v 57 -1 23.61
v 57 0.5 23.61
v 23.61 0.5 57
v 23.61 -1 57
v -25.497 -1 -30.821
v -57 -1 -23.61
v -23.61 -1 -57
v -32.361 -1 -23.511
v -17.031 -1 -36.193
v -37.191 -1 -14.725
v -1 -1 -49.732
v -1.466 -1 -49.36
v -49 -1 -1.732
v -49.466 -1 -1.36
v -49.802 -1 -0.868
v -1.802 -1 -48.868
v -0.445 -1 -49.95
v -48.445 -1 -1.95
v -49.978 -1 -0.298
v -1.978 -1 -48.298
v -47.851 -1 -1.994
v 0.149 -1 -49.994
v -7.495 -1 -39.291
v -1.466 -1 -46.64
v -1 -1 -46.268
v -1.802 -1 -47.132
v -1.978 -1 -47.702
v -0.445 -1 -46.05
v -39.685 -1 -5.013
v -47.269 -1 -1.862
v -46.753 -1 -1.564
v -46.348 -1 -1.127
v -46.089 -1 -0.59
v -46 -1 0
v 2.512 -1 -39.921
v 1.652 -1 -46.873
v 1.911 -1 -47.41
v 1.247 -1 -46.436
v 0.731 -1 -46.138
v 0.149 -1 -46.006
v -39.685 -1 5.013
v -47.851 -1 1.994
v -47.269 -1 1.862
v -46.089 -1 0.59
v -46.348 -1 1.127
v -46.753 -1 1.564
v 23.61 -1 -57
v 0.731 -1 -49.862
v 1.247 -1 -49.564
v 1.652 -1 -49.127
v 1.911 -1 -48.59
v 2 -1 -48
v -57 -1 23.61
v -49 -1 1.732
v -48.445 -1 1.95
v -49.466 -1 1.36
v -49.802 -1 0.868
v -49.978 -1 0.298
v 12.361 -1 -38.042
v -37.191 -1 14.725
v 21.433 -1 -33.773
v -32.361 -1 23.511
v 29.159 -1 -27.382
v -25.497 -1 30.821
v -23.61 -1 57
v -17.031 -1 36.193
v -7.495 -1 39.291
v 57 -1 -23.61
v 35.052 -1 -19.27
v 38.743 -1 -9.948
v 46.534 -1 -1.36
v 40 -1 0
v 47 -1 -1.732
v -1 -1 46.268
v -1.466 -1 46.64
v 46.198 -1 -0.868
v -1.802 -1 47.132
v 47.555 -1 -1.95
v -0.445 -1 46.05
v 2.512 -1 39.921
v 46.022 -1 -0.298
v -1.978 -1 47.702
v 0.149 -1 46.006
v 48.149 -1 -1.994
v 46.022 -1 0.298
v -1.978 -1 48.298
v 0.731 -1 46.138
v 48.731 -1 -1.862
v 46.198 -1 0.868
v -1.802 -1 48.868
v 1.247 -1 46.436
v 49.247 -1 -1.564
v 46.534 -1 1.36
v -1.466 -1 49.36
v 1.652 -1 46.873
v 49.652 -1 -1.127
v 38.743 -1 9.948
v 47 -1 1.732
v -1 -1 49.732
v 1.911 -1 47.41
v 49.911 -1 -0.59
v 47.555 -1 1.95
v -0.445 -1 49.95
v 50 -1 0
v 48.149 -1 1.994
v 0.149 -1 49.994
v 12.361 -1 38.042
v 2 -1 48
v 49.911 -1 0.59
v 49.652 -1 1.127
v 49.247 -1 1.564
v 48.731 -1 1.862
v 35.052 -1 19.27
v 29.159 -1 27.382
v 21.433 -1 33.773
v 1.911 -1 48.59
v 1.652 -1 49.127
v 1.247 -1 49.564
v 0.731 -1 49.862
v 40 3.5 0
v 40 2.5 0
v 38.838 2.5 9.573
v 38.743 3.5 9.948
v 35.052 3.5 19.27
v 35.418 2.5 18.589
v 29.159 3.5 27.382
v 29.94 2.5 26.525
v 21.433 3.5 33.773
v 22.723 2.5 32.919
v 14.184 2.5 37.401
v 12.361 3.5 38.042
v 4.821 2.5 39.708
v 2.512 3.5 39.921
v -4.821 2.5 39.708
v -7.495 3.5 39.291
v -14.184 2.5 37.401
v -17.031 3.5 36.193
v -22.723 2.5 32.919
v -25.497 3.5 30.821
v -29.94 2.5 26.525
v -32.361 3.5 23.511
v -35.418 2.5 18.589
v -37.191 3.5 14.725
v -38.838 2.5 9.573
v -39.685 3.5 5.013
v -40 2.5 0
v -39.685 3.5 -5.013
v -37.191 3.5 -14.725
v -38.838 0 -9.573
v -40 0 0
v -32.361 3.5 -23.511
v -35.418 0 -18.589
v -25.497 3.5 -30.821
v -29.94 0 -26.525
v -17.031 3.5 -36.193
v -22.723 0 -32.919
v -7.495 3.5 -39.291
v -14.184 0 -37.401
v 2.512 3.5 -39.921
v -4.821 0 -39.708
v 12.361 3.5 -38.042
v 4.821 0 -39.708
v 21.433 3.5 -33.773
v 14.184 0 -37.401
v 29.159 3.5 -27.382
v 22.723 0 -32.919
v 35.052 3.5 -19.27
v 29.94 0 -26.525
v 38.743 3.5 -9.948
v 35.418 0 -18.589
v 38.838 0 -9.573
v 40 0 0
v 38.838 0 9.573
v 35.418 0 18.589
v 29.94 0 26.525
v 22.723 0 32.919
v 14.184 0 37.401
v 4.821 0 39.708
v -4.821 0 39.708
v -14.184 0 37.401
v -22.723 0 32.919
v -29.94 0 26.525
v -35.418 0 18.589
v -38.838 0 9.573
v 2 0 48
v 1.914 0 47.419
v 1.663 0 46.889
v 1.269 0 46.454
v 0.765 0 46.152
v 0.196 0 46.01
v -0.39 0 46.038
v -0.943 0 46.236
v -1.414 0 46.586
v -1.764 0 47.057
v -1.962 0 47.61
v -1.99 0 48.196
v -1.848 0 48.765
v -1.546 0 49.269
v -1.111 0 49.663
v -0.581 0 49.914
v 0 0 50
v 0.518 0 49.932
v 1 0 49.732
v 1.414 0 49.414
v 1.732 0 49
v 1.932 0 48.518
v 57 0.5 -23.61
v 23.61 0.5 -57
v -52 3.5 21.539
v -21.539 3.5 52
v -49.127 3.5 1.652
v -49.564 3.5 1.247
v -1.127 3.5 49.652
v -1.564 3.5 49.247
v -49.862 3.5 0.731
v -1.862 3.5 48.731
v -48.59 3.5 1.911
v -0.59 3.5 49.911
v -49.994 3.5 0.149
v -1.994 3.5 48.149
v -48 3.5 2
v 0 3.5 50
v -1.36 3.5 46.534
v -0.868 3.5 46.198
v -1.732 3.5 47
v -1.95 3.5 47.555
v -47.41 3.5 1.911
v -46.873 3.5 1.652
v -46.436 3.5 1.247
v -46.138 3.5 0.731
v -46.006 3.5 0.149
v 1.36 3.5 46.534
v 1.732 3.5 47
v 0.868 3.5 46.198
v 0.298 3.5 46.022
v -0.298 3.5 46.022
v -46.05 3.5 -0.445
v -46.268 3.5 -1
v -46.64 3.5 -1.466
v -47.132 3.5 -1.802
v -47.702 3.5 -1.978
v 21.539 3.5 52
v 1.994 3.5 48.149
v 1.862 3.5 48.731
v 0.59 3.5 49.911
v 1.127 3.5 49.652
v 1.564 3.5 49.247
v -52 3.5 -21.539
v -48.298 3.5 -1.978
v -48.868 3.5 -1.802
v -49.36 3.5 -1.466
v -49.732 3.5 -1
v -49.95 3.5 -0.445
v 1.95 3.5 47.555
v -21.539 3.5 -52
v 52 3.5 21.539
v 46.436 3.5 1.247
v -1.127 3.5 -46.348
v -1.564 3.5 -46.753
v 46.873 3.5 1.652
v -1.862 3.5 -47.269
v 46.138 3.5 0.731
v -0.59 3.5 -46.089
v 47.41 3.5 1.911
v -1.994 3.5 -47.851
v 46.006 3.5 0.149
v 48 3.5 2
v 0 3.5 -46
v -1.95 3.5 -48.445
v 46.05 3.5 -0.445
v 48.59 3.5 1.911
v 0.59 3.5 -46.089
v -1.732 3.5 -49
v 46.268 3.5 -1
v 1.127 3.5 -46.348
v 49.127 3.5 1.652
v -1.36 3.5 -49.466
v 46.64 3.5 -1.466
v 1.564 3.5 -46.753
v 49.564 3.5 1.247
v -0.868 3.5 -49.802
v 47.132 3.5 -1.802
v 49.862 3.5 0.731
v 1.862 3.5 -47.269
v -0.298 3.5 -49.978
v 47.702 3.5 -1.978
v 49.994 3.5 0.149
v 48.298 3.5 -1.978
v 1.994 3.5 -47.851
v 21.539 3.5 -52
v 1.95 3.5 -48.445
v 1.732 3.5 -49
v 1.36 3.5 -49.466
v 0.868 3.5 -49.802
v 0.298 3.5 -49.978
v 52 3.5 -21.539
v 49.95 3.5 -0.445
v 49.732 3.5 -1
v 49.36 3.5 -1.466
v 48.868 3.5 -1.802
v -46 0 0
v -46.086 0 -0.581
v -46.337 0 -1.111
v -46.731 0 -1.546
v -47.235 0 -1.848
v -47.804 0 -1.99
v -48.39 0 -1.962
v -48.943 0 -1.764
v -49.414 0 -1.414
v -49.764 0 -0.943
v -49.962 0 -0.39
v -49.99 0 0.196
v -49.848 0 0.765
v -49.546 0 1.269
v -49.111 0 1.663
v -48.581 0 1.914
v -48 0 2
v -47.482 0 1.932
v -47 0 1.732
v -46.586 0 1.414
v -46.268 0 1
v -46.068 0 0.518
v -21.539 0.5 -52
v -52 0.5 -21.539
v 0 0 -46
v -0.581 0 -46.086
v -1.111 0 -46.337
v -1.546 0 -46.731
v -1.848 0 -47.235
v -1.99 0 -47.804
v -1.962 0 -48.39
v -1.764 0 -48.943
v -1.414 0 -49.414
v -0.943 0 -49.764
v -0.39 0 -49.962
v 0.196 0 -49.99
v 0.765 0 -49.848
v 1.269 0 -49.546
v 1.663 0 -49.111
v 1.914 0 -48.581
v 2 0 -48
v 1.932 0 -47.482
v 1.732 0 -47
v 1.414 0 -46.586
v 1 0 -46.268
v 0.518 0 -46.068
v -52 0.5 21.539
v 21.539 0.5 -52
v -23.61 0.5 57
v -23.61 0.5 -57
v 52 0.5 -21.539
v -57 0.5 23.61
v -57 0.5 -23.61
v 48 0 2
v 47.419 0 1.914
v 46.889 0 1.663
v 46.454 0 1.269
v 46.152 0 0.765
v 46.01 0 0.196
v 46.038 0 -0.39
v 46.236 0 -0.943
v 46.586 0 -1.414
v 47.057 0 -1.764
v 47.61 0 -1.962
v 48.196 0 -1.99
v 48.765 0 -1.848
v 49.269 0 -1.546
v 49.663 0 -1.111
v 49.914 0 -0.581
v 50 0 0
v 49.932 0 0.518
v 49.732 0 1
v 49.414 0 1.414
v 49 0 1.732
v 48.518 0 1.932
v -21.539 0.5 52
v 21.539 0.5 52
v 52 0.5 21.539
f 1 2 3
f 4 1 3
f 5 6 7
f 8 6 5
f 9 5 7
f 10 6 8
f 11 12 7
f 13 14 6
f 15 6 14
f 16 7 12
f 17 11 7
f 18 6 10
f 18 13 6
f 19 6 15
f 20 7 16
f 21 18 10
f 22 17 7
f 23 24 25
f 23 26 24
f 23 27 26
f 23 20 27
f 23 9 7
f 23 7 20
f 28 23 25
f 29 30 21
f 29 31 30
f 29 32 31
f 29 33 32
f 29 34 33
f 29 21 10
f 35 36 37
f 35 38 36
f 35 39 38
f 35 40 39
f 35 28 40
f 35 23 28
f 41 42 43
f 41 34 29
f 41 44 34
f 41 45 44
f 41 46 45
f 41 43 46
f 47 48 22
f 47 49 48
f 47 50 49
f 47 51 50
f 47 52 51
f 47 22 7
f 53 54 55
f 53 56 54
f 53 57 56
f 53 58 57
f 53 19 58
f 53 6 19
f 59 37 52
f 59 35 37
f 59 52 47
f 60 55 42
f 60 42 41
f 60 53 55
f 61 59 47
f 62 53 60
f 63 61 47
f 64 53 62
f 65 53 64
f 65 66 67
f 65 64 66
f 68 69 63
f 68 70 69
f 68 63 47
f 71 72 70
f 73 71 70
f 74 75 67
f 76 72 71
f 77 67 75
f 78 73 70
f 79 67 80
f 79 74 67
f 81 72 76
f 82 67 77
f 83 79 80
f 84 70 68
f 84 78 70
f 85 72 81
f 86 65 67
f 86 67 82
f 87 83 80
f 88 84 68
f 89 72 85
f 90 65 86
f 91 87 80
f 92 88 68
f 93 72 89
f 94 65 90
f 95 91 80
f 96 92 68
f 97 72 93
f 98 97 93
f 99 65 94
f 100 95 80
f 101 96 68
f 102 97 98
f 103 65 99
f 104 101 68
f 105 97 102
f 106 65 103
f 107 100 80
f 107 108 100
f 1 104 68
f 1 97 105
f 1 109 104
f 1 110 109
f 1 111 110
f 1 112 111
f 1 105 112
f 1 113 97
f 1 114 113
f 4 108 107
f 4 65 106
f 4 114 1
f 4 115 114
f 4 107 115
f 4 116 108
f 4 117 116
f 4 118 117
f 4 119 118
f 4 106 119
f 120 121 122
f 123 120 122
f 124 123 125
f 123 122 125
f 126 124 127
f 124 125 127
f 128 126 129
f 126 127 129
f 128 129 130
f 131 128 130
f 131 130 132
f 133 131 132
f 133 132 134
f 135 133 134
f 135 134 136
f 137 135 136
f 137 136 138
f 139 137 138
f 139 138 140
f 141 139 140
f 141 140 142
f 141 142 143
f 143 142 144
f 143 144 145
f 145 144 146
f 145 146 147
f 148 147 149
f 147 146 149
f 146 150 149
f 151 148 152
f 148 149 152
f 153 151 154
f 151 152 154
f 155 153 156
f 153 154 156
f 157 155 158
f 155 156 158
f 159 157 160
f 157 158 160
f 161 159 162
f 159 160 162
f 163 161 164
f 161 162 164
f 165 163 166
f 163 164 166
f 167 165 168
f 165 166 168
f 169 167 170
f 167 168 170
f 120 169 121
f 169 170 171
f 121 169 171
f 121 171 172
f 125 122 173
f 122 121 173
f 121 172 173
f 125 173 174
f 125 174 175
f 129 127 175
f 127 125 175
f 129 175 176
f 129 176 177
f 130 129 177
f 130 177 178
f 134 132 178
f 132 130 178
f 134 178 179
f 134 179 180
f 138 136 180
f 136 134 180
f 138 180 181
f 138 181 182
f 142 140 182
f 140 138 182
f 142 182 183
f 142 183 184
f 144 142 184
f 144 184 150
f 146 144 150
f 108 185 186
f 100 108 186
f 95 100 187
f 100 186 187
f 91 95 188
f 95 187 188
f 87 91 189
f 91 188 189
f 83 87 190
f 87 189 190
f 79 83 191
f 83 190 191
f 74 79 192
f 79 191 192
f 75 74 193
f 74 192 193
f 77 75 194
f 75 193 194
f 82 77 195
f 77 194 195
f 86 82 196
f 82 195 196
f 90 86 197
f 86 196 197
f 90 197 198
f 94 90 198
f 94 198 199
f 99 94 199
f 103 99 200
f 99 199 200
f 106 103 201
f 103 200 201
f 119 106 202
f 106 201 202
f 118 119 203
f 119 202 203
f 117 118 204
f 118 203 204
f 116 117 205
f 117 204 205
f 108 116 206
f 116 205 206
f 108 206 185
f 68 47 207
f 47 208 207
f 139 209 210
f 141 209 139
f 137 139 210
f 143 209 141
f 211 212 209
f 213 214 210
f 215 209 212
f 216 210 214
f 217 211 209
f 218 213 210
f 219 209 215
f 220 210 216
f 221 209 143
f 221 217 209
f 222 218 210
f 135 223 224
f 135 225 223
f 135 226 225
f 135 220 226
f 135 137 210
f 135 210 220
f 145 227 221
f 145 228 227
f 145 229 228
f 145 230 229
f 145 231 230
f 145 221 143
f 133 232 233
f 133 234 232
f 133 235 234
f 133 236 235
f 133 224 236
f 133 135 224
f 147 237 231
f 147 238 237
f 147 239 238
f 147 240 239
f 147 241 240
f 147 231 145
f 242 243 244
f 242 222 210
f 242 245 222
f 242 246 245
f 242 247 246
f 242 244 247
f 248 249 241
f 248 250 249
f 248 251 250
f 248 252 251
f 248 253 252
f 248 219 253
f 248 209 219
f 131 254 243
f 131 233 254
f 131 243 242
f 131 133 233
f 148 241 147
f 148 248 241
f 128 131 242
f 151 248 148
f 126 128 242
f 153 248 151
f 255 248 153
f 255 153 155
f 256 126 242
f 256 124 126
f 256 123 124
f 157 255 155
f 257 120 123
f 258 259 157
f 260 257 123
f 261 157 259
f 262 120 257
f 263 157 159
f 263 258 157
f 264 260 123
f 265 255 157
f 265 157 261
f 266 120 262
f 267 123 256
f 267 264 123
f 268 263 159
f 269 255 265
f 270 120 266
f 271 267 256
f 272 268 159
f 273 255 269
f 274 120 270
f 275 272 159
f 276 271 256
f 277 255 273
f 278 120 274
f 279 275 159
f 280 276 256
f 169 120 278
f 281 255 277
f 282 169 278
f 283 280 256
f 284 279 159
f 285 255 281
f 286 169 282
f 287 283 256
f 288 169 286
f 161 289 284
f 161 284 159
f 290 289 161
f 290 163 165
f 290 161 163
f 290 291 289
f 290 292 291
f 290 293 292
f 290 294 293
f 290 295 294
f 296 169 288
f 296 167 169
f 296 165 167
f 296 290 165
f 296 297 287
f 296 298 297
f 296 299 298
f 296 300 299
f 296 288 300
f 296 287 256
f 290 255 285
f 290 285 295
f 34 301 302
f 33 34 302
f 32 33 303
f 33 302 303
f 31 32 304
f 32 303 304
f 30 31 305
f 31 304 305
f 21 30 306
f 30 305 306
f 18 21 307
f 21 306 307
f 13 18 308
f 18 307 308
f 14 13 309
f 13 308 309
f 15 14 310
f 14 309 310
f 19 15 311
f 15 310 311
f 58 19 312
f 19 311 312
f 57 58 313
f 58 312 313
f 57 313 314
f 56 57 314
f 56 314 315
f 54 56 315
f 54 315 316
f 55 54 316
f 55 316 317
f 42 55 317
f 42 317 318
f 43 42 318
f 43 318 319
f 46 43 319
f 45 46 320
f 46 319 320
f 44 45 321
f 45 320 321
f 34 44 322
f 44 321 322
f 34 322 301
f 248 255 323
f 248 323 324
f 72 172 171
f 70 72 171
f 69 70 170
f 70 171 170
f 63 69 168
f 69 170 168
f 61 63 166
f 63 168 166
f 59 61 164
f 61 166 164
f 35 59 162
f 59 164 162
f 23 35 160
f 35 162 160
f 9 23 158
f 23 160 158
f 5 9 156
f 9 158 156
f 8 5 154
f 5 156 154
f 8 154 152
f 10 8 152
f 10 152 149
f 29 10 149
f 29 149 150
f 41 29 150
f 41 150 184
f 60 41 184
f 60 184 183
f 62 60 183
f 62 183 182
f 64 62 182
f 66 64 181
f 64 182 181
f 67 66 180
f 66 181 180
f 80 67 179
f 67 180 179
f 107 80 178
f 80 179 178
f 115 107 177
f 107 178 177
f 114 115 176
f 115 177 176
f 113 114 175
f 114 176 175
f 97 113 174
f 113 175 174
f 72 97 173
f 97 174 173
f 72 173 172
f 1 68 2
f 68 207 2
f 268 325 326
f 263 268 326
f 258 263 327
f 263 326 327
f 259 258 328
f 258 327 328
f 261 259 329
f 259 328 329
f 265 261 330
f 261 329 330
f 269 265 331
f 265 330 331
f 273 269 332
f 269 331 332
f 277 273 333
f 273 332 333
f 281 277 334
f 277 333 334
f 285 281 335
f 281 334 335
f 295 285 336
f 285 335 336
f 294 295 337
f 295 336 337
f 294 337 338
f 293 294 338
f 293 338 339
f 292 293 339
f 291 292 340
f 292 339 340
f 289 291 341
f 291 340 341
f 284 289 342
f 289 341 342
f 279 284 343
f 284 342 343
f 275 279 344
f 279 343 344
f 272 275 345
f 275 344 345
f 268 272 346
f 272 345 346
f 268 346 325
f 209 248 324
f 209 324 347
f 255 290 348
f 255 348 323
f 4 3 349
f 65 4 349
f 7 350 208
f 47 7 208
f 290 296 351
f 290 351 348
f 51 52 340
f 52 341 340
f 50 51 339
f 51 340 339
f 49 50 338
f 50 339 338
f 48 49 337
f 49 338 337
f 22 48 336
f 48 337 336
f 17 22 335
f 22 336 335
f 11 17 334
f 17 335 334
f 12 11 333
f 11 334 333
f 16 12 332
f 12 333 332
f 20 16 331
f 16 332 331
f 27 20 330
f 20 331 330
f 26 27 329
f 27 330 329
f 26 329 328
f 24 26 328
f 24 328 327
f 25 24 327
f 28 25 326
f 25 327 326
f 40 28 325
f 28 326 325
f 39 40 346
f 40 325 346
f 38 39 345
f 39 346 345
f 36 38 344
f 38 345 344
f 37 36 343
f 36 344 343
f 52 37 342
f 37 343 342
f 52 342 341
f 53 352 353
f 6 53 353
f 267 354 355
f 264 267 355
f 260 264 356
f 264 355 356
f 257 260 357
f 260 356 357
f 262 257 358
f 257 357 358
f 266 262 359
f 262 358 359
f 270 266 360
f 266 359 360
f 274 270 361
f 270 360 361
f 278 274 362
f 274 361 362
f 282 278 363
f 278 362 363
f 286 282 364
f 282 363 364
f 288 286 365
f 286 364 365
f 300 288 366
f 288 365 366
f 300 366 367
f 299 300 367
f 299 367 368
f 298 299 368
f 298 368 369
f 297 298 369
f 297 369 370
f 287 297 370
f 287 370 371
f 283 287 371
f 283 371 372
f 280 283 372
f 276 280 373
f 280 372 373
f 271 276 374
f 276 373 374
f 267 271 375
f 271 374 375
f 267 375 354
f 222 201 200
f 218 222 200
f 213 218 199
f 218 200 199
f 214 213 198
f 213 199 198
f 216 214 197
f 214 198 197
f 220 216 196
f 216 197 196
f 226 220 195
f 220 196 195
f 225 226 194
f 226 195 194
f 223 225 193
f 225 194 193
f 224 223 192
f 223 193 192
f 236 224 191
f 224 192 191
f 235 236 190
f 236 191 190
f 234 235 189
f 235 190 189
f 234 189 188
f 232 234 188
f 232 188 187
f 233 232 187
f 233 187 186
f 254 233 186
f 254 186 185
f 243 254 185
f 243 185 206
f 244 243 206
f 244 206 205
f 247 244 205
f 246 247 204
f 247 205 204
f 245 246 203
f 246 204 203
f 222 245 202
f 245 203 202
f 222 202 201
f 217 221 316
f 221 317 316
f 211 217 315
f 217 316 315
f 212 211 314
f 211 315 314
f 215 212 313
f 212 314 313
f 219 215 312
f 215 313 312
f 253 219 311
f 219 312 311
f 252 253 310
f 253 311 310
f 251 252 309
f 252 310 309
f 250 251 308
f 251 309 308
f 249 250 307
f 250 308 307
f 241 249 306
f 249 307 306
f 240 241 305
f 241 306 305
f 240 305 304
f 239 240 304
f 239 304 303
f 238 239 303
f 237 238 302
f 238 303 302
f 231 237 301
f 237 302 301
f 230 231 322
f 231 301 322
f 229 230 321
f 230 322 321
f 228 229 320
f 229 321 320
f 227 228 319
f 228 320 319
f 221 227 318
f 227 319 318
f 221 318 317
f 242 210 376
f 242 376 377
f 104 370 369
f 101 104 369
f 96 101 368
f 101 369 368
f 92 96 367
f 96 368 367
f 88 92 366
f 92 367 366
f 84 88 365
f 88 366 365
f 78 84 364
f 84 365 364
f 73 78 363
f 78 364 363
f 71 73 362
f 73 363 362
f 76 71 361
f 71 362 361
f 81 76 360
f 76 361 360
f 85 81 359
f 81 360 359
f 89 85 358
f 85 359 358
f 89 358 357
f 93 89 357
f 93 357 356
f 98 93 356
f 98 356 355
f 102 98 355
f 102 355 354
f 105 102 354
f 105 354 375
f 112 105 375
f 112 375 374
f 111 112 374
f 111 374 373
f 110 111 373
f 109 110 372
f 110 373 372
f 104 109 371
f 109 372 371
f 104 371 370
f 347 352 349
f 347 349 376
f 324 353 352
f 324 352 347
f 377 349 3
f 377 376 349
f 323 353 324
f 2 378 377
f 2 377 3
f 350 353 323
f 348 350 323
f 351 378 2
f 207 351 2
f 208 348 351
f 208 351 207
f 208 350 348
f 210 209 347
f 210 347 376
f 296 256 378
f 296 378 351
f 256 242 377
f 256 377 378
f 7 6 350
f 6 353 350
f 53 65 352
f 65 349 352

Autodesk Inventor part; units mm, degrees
ref_plane "YZ Plane" through (0, 0, 0) normal (1, 0, 0) x (0, 1, 0)
ref_plane "XZ Plane" through (0, 0, 0) normal (0, 1, 0) x (-1, 0, 0)
ref_plane "XY Plane" through (0, 0, 0) normal (0, 0, 1) x (1, 0, 0)
sketch "Skizze4" plane through (0, 0, 0) normal (0, 1, 0) x (-1, 0, 0)
  line L0 (-23.6102, 57) -> (23.6102, 57)
  line L1 (23.6102, 57) -> (57, 23.6102)
  line L2 (57, 23.6102) -> (57, -23.6102)
  line L3 (57, -23.6102) -> (23.6102, -57)
  line L4 (23.6102, -57) -> (-23.6102, -57)
  line L5 (-23.6102, -57) -> (-57, -23.6102)
  line L6 (-57, -23.6102) -> (-57, 23.6102)
  line L7 (-57, 23.6102) -> (-23.6102, 57)
  line L8 (0, -79.8) -> (0, 79.8) construction
  line L9 (79.8, 0) -> (-79.8, 0) construction
  circle A0 centre (0, 0) radius 40
  dimension "d4" = 114
  dimension "d5" = 80
extrude "Extrusion2" add sketch "Skizze4" along normal blind 2.5
sketch "Skizze5" plane through (0, 2.5, 0) normal (0, 1, 0) x (1, 0, 0)
  circle A0 centre (0, 0) radius 40 projected
  line L0 (-23.6102, -57) -> (23.6102, -57) projected
  line L1 (23.6102, -57) -> (57, -23.6102) projected
  line L2 (57, -23.6102) -> (57, 23.6102) projected
  line L3 (57, 23.6102) -> (23.6102, 57) projected
  line L4 (23.6102, 57) -> (-23.6102, 57) projected
  line L5 (-23.6102, 57) -> (-57, 23.6102) projected
  line L6 (-57, 23.6102) -> (-57, -23.6102) projected
  line L7 (-57, -23.6102) -> (-23.6102, -57) projected
  line L8 (-52, 21.5391) -> (-21.5391, 52)
  line L9 (-21.5391, 52) -> (21.5391, 52)
  line L10 (21.5391, 52) -> (52, 21.5391)
  line L11 (52, 21.5391) -> (52, -21.5391)
  line L12 (52, -21.5391) -> (21.5391, -52)
  line L13 (21.5391, -52) -> (-21.5391, -52)
  line L14 (-21.5391, -52) -> (-52, -21.5391)
  line L15 (-52, -21.5391) -> (-52, 21.5391)
  dimension "d8" = 5
extrude "Extrusion3" add sketch "Skizze5" along normal blind 2.5 contours L8 L9 L10 L11 L12 L13 L14 L15
sketch "Skizze6" plane through (0, 5, 0) normal (0, 1, 0) x (1, 0, 0)
  circle A0 centre (0, 0) radius 40 construction
  line L0 (-21.5391, 52) -> (-52, 21.5391) construction
  line L1 (-52, 21.5391) -> (-52, -21.5391) construction
  line L2 (-52, -21.5391) -> (-21.5391, -52) construction
  line L3 (-21.5391, -52) -> (21.5391, -52) construction
  line L4 (21.5391, -52) -> (52, -21.5391) construction
  line L5 (52, -21.5391) -> (52, 21.5391) construction
  line L6 (52, 21.5391) -> (21.5391, 52) construction
  line L7 (21.5391, 52) -> (-21.5391, 52) construction
  line L8 (0, 79.8) -> (0, -79.8) construction
  point P0 (0, 48)
  point P1 (-48, 0)
  point P2 (0, -48)
  point P3 (48, 0)
  dimension "d11" = 48
  dimension "d14" = 360
hole "Bohrung1" at (0, 5, -48) at (-48, 5, 0) at (0, 5, 48) at (48, 5, 0) direction (0, -1, 0) diameter 4 end through all
sketch "Skizze7" plane through (0, 2.5, 0) normal (0, 1, 0) x (1, 0, 0)
  line L0 (-21.5391, 52) -> (21.5391, 52) projected
  line L1 (21.5391, 52) -> (52, 21.5391) projected
  line L2 (52, 21.5391) -> (52, -21.5391) projected
  line L3 (52, -21.5391) -> (21.5391, -52) projected
  line L4 (21.5391, -52) -> (-21.5391, -52) projected
  line L5 (-21.5391, -52) -> (-52, -21.5391) projected
  line L6 (-52, -21.5391) -> (-52, 21.5391) projected
  line L7 (-52, 21.5391) -> (-21.5391, 52) projected
  line L8 (-23.6102, -57) -> (23.6102, -57) projected
  line L9 (23.6102, -57) -> (57, -23.6102) projected
  line L10 (57, -23.6102) -> (57, 23.6102) projected
  line L11 (57, 23.6102) -> (23.6102, 57) projected
  line L12 (23.6102, 57) -> (-23.6102, 57) projected
  line L13 (-23.6102, 57) -> (-57, 23.6102) projected
  line L14 (-57, 23.6102) -> (-57, -23.6102) projected
  line L15 (-57, -23.6102) -> (-23.6102, -57) projected
  point P0 (0, 0)
extrude "Extrusion4" cut sketch "Skizze7" against normal blind 1
sketch "Skizze8" plane through (0, 0, 0) normal (0, -1, 0) x (1, 0, 0)
  circle A0 centre (0, 48) radius 2 projected
  circle A1 centre (0, -48) radius 2 projected
  circle A2 centre (-48, 0) radius 2 projected
  circle A3 centre (48, 0) radius 2 projected
  circle A4 centre (0, 0) radius 40 projected
  line L0 (23.6102, 57) -> (-23.6102, 57) projected
  line L1 (-23.6102, 57) -> (-57, 23.6102) projected
  line L2 (-57, 23.6102) -> (-57, -23.6102) projected
  line L3 (-57, -23.6102) -> (-23.6102, -57) projected
  line L4 (-23.6102, -57) -> (23.6102, -57) projected
  line L5 (23.6102, -57) -> (57, -23.6102) projected
  line L6 (57, -23.6102) -> (57, 23.6102) projected
  line L7 (57, 23.6102) -> (23.6102, 57) projected
extrude "Extrusion5" add sketch "Skizze8" along normal blind 1
sketch "Skizze9" plane through (0, 5, 0) normal (0, 1, 0) x (1, 0, 0)
  circle A0 centre (0, -48) radius 2 projected
  circle A1 centre (0, 48) radius 2 projected
  circle A2 centre (-48, 0) radius 2 projected
  circle A3 centre (48, 0) radius 2 projected
  circle A4 centre (0, 0) radius 40 projected
  line L0 (-21.5391, 52) -> (-52, 21.5391) projected
  line L1 (-52, 21.5391) -> (-52, -21.5391) projected
  line L2 (-52, -21.5391) -> (-21.5391, -52) projected
  line L3 (-21.5391, -52) -> (21.5391, -52) projected
  line L4 (21.5391, -52) -> (52, -21.5391) projected
  line L5 (52, -21.5391) -> (52, 21.5391) projected
  line L6 (52, 21.5391) -> (21.5391, 52) projected
  line L7 (21.5391, 52) -> (-21.5391, 52) projected
extrude "Extrusion6" cut sketch "Skizze9" against normal blind 0.5 contours A0 | A1 | A2 | A3 | L7 L6 L5 L4 L3 L2 L1 L0
sketch "Skizze10" plane through (0, 4.5, 0) normal (0, 1, 0) x (1, 0, 0)
  point P0 (0, 0)
sketch "Skizze11" plane through (0, 4.5, 0) normal (0, 1, 0) x (1, 0, 0)
  circle A0 centre (0, -48) radius 2 projected
  circle A1 centre (0, 48) radius 2 projected
  circle A2 centre (-48, 0) radius 2 projected
  circle A3 centre (48, 0) radius 2 projected
  circle A4 centre (0, 0) radius 40 projected
  line L0 (-52, 21.5391) -> (-21.5391, 52) projected
  line L1 (-52, -21.5391) -> (-52, 21.5391) projected
  line L2 (-21.5391, -52) -> (-52, -21.5391) projected
  line L3 (21.5391, -52) -> (-21.5391, -52) projected
  line L4 (52, -21.5391) -> (21.5391, -52) projected
  line L5 (52, 21.5391) -> (52, -21.5391) projected
  line L6 (21.5391, 52) -> (52, 21.5391) projected
  line L7 (-21.5391, 52) -> (21.5391, 52) projected
extrude "Extrusion7" cut sketch "Skizze11" against normal blind 1
sketch "Skizze12" plane through (0, 1.5, 0) normal (0, 1, 0) x (1, 0, 0)
  line L0 (-21.5391, 52) -> (-52, 21.5391) projected
  line L1 (21.5391, 52) -> (-21.5391, 52) projected
  line L2 (52, 21.5391) -> (21.5391, 52) projected
  line L3 (52, -21.5391) -> (52, 21.5391) projected
  line L4 (21.5391, -52) -> (52, -21.5391) projected
  line L5 (-21.5391, -52) -> (21.5391, -52) projected
  line L6 (-52, -21.5391) -> (-21.5391, -52) projected
  line L7 (-52, 21.5391) -> (-52, -21.5391) projected
  line L8 (23.6102, -57) -> (-23.6102, -57) projected
  line L9 (57, -23.6102) -> (23.6102, -57) projected
  line L10 (57, 23.6102) -> (57, -23.6102) projected
  line L11 (23.6102, 57) -> (57, 23.6102) projected
  line L12 (-23.6102, 57) -> (23.6102, 57) projected
  line L13 (-57, 23.6102) -> (-23.6102, 57) projected
  line L14 (-57, -23.6102) -> (-57, 23.6102) projected
  line L15 (-23.6102, -57) -> (-57, -23.6102) projected
  point P0 (0, 0)
extrude "Extrusion8" cut sketch "Skizze12" against normal blind 1
properties part number "Stage3" material "3.3547 AlMg4,5Mn (AW-5083/H111)"
